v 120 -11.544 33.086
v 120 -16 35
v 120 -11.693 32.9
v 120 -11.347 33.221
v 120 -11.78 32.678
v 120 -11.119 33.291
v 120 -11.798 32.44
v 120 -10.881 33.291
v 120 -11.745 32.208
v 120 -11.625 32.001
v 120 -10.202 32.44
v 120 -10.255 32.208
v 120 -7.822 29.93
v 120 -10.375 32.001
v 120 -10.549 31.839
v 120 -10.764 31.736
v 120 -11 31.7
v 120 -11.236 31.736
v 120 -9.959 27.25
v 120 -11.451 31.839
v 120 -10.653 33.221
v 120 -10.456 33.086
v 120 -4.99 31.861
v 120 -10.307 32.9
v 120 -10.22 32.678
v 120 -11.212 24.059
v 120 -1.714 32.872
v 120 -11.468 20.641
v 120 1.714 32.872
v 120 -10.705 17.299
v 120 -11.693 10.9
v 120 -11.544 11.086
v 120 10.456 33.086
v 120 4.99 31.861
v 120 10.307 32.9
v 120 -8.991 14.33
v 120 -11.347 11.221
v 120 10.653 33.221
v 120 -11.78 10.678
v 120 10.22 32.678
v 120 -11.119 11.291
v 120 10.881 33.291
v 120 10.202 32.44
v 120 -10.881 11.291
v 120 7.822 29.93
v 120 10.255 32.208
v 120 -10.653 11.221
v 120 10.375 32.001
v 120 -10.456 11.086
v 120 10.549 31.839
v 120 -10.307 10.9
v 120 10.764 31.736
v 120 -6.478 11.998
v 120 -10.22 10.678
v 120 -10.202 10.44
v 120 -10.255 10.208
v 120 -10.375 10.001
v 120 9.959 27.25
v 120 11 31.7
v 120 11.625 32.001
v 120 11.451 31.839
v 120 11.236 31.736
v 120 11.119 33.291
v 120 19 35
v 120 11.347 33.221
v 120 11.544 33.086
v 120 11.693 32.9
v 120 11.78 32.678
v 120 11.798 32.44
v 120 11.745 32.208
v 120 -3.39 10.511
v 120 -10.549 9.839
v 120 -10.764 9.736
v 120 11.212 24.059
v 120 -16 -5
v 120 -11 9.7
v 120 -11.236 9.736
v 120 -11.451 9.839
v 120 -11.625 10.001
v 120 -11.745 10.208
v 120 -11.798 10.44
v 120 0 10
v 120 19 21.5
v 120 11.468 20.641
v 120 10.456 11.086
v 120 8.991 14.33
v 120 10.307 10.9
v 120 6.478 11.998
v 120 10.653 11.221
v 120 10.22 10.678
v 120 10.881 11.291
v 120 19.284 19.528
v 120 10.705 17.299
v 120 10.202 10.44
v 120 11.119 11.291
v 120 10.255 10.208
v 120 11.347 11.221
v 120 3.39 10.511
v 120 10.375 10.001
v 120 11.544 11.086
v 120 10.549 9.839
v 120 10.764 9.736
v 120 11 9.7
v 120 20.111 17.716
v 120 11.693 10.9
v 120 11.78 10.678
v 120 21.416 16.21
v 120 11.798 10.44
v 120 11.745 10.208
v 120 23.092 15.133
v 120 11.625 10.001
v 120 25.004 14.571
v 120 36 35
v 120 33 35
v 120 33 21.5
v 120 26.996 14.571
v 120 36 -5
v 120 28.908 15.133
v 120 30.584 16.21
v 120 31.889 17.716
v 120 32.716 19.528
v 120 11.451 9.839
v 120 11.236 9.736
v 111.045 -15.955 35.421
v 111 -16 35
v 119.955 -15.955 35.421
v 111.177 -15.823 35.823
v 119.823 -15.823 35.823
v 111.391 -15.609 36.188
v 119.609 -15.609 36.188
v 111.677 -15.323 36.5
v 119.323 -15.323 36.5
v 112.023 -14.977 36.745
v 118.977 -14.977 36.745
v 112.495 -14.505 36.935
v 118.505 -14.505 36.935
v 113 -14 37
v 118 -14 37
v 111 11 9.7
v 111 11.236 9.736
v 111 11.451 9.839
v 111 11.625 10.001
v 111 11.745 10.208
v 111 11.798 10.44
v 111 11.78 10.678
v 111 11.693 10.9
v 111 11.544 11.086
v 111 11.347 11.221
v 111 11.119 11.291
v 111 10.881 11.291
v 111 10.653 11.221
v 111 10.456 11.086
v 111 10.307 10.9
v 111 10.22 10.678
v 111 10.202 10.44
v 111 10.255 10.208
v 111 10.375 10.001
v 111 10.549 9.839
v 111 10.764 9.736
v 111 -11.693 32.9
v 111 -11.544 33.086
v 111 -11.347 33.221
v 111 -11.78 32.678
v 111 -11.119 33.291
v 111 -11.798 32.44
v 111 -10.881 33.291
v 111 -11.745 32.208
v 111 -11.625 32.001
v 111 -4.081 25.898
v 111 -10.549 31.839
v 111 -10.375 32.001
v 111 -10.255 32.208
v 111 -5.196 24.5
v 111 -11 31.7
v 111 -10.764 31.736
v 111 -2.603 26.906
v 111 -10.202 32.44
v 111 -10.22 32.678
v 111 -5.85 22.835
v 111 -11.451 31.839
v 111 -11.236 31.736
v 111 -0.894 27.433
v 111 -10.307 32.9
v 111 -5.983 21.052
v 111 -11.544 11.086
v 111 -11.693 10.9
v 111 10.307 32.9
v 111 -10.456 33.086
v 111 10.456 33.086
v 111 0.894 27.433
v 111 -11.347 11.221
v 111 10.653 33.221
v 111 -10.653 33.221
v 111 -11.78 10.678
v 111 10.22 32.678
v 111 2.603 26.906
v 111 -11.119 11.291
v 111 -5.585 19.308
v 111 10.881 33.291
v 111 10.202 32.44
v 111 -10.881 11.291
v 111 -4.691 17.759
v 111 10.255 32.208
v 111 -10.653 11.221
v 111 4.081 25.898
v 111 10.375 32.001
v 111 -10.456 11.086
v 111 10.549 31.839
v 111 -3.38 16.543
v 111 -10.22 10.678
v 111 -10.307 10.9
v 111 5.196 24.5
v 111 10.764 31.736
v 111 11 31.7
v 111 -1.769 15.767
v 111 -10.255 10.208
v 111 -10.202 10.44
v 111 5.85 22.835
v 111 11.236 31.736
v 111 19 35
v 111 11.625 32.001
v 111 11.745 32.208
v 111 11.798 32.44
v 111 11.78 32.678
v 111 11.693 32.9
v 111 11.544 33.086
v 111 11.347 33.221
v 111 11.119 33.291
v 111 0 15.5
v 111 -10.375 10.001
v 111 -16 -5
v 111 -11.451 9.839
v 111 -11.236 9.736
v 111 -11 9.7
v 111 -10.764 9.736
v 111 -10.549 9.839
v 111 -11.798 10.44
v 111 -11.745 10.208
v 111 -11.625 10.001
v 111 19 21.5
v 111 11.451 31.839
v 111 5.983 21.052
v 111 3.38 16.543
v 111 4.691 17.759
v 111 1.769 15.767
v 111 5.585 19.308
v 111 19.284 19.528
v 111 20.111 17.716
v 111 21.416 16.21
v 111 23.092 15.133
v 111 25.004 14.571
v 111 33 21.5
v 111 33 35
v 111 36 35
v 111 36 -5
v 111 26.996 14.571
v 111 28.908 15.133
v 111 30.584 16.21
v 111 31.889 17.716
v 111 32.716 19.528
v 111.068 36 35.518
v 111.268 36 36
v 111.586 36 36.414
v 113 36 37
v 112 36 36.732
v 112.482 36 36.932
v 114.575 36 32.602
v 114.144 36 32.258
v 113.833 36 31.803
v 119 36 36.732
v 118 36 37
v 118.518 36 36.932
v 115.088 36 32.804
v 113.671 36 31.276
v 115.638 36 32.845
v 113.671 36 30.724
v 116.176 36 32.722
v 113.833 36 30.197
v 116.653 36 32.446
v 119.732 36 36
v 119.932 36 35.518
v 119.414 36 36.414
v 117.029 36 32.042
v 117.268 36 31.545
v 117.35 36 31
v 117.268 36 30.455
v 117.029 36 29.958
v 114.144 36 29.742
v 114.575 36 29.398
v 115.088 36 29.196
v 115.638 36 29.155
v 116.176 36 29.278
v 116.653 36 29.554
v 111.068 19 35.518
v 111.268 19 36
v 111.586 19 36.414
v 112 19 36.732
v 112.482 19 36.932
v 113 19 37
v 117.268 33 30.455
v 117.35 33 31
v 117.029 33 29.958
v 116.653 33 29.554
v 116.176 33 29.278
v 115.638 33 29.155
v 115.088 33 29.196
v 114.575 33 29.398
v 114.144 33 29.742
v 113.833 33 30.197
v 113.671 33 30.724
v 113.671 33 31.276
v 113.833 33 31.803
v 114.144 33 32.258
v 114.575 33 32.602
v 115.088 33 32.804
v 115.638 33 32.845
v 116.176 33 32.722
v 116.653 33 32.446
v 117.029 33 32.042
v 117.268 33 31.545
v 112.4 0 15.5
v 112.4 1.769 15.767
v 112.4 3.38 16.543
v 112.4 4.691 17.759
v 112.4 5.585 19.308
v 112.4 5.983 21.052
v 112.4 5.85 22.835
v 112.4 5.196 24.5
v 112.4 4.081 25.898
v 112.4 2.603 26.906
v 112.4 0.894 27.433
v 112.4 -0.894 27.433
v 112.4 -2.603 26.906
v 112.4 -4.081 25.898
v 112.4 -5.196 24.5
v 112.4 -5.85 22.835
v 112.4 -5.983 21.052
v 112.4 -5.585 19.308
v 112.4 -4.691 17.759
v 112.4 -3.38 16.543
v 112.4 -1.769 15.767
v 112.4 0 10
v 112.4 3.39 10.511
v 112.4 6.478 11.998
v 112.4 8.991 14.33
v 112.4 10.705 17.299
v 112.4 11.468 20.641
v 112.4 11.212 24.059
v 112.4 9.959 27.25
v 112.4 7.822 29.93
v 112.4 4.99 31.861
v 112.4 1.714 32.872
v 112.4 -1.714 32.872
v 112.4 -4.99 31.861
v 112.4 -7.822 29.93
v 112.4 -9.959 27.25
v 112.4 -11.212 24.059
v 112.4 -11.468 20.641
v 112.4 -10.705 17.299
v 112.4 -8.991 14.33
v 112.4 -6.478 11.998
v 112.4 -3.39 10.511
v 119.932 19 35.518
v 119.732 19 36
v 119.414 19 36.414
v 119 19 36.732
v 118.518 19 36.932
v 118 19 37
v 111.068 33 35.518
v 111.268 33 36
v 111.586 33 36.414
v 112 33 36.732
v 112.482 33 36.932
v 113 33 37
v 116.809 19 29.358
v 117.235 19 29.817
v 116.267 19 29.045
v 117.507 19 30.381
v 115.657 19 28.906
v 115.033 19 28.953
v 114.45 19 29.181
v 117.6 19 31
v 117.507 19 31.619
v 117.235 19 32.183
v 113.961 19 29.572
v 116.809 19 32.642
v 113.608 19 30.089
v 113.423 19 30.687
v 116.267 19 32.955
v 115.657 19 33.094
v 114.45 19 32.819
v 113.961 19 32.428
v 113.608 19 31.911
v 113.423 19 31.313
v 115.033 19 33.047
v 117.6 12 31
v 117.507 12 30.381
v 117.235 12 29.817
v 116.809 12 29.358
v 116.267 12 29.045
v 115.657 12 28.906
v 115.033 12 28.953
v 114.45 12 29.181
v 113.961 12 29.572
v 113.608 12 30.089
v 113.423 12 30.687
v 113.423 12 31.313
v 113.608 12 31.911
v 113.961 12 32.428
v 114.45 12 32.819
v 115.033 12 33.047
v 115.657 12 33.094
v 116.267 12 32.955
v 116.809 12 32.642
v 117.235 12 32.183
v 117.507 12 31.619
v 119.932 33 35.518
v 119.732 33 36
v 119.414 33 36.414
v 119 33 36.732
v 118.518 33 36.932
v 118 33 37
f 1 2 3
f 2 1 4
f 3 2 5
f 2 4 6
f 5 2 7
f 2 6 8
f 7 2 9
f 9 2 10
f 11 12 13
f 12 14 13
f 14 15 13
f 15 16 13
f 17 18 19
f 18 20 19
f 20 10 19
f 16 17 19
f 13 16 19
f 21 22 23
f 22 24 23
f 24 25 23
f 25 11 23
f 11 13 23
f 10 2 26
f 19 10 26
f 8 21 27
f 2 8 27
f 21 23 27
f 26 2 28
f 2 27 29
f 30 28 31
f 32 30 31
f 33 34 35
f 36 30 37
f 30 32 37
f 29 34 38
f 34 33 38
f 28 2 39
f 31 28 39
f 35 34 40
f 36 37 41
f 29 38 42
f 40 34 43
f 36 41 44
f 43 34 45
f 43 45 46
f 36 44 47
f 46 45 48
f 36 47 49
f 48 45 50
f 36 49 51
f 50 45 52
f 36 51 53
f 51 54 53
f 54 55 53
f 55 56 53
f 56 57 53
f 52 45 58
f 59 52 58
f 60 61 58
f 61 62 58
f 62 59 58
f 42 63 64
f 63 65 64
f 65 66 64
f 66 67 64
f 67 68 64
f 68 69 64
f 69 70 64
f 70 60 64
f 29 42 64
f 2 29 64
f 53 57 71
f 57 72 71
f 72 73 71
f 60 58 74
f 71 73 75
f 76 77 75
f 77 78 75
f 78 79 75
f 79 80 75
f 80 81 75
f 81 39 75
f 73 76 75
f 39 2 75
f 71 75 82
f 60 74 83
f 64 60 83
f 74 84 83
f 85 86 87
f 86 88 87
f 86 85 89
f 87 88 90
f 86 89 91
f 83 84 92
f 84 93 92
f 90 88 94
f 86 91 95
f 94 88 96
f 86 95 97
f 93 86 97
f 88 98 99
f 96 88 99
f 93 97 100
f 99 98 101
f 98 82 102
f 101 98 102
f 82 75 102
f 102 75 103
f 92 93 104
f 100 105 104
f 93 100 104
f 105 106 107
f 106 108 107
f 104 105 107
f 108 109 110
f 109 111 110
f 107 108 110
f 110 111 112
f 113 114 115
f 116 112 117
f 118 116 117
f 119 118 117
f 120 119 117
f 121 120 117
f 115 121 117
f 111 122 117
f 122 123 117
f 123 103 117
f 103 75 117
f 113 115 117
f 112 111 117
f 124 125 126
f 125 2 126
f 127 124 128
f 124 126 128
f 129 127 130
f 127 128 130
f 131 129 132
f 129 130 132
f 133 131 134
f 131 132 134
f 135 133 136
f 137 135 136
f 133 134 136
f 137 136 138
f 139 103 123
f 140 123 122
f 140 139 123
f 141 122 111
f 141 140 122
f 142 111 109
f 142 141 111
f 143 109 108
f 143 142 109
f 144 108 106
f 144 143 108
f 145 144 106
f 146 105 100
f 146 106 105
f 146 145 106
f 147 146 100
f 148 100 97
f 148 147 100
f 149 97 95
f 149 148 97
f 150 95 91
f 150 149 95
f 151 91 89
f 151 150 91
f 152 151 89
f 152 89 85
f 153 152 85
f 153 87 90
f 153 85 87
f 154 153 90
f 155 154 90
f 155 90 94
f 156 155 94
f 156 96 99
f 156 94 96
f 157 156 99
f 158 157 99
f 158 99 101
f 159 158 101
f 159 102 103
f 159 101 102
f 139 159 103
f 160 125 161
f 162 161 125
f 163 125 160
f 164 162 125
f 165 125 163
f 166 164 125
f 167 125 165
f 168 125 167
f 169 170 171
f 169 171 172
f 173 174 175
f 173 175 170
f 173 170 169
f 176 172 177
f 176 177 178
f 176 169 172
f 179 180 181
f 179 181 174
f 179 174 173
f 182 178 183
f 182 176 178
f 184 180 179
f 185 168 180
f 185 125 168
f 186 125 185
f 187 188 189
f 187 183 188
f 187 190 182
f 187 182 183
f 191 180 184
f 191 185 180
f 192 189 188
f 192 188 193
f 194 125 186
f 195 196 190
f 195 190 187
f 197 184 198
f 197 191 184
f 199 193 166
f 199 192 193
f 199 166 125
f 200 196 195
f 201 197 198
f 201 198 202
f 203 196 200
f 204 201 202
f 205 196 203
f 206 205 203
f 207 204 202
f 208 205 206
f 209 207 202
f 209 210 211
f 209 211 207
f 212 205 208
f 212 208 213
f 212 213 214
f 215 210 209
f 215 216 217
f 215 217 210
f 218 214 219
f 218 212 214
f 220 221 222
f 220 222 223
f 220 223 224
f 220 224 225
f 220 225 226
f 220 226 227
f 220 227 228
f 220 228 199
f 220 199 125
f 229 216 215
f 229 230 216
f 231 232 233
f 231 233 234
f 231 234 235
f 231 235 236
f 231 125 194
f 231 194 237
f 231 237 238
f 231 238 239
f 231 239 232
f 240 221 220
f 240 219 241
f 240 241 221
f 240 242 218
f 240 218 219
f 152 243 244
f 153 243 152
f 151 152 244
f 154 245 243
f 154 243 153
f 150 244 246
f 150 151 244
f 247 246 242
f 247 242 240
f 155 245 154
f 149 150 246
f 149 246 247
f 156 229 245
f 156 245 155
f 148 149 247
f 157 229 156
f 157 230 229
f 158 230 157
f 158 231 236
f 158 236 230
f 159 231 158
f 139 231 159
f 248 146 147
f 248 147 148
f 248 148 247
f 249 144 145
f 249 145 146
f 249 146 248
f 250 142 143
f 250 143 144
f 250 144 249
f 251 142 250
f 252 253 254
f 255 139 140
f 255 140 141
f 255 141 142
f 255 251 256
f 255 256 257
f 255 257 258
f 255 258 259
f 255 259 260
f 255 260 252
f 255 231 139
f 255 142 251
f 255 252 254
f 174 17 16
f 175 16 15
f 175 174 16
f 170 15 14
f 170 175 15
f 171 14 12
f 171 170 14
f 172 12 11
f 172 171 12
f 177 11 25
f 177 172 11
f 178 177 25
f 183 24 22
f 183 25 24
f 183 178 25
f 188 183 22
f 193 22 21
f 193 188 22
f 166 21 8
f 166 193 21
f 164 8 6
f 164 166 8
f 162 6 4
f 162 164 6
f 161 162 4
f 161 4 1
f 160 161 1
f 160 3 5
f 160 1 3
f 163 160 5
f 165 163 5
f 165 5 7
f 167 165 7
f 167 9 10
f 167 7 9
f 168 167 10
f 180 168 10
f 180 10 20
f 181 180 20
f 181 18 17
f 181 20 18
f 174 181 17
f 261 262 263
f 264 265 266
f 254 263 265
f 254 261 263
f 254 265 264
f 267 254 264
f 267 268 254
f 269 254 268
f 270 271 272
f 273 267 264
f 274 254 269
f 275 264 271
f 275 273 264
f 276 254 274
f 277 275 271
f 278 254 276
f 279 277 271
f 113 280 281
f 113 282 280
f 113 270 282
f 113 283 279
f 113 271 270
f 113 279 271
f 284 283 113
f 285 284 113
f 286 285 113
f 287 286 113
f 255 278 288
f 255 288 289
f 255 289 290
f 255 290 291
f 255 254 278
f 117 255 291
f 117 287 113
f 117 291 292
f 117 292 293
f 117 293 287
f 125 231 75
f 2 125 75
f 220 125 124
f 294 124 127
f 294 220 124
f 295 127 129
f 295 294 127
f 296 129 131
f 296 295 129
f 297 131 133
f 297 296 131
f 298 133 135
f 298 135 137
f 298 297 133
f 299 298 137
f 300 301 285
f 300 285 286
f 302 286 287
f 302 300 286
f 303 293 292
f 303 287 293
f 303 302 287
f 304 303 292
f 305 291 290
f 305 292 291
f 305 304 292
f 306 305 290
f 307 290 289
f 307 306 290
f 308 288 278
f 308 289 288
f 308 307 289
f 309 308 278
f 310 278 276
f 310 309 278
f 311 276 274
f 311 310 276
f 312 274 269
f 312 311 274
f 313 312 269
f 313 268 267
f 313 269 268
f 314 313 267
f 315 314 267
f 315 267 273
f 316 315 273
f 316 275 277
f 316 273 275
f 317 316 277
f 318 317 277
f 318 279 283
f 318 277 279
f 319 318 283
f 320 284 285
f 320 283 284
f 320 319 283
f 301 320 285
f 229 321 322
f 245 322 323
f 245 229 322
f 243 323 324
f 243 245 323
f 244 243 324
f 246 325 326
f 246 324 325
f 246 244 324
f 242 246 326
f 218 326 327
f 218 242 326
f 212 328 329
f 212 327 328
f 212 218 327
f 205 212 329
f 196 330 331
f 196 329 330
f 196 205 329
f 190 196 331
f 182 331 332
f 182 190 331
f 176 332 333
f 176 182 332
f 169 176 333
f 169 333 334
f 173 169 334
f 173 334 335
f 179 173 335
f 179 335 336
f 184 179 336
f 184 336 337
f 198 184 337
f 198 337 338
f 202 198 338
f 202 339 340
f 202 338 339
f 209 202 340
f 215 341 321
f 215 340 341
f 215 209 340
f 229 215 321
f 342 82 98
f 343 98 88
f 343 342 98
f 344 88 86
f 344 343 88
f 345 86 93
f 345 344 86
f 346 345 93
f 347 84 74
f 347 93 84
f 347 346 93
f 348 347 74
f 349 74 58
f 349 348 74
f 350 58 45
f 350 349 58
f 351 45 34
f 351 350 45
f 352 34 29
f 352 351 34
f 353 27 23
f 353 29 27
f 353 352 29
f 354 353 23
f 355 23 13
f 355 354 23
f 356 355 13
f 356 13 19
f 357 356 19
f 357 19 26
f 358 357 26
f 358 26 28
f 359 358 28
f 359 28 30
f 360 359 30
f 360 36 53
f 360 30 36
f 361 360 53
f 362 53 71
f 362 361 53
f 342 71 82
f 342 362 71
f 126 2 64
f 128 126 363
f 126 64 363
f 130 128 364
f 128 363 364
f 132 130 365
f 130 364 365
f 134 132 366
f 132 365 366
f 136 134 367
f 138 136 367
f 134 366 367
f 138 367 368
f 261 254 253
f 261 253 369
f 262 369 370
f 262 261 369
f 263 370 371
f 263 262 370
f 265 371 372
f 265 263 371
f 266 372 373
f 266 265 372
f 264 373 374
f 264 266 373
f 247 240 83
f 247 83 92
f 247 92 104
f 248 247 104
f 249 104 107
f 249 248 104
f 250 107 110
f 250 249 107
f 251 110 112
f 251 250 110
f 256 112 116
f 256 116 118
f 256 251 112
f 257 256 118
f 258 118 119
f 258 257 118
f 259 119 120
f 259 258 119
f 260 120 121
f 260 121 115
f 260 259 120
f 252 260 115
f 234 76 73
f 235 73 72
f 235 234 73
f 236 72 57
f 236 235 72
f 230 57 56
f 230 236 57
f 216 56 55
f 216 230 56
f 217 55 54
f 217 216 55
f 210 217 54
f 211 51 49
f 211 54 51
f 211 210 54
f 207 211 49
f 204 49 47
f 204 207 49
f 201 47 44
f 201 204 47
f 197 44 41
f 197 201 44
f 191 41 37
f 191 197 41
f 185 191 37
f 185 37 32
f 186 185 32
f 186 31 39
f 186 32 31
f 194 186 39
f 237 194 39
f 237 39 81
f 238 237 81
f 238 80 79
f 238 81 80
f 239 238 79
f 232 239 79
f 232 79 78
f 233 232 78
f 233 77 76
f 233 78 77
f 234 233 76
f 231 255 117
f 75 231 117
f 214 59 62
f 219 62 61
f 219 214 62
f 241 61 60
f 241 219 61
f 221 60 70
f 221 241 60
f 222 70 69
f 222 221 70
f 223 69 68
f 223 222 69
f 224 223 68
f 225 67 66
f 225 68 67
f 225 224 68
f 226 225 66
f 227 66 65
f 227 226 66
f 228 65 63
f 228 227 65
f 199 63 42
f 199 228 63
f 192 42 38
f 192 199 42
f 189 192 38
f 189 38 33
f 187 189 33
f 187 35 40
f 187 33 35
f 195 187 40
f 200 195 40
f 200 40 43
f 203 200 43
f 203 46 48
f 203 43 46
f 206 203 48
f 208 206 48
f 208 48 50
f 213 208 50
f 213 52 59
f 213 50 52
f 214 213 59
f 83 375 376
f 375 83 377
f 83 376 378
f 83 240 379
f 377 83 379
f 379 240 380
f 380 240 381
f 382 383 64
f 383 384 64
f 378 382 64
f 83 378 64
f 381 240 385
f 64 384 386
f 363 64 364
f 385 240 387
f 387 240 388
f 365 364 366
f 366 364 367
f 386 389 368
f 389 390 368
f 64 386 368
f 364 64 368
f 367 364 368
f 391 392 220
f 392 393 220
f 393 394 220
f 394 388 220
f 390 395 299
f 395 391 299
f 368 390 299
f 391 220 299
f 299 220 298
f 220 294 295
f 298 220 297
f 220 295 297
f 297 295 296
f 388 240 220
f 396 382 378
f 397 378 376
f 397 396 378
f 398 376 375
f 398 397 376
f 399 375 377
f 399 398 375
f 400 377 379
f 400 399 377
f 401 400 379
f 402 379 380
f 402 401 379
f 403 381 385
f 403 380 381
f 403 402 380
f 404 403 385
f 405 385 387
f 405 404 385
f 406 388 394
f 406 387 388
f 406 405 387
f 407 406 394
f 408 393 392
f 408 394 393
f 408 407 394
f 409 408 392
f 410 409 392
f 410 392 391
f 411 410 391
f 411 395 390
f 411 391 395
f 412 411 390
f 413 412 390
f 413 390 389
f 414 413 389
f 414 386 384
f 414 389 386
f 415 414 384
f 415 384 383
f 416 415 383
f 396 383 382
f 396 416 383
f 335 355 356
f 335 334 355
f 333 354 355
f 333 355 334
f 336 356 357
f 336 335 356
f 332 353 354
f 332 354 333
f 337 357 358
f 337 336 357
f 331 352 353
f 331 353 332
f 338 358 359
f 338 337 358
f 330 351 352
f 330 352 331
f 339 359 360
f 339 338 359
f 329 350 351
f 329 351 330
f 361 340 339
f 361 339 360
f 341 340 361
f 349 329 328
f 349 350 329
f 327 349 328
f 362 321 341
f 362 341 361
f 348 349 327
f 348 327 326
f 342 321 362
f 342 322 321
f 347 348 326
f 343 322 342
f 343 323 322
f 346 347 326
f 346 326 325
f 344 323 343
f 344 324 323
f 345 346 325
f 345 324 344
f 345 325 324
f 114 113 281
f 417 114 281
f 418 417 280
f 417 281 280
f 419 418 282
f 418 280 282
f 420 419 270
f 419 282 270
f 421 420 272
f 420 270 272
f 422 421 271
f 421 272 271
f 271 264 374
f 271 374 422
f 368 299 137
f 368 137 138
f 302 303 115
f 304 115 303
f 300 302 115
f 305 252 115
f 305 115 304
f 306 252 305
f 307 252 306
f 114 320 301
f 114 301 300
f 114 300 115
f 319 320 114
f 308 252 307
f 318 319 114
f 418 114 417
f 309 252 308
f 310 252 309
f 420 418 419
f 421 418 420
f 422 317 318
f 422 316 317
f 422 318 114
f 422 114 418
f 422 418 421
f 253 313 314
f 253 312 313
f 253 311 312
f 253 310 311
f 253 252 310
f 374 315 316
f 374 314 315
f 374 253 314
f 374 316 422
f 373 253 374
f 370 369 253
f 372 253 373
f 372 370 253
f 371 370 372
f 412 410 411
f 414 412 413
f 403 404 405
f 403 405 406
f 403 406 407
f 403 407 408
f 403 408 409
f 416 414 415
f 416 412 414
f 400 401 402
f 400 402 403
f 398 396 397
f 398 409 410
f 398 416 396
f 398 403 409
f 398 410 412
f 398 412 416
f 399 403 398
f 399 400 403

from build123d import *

# Parameters (mm, degrees)
CYLINDER100_R               = 6
CYLINDER100_DEPTH           = 9
CYLINDER020_R               = 0.8
CYLINDER020_DEPTH           = 20
ARRAY001006_X_COUNT         = 2
ARRAY001006_X_PITCH         = 22
ARRAY001006_Y_COUNT         = 2
ARRAY001006_Y_PITCH         = 22
ARRAY001006_PLACEMENT_ANGLE = 90
CYLINDER101_R               = 7
CYLINDER101_DEPTH           = 9
BOX008_W                    = 14
BOX008_H                    = 50
BOX008_DEPTH                = 9
FUSION008_ROLL_ANGLE        = 90
FUSION008_PLACEMENT_ANGLE   = 90
CYLINDER106_R               = 2.1
CYLINDER106_DEPTH           = 10
CYLINDER105_R               = 1.85
CYLINDER105_DEPTH           = 20
FUSION009_PLACEMENT_ANGLE   = 90
CYLINDER099_R               = 11.5
CYLINDER099_DEPTH           = 9
BOX_W                       = 9
BOX_H                       = 52
BOX_DEPTH                   = 42
FILLET_R                    = 2


with BuildPart() as lead_hole:
    # Cylinder100 → Cylinder100 (new body)
    with BuildSketch(Plane(origin=(111, 0, 21.5), x_dir=(0, 0, -1), z_dir=(1, 0, 0))):
        Circle(CYLINDER100_R)
    extrude(amount=CYLINDER100_DEPTH)


with BuildPart() as lead_holder_hole_array001:
    # Cylinder020 → Cylinder020 (new body)
    with BuildSketch(Plane.XY):
        Circle(CYLINDER020_R)
    extrude(amount=CYLINDER020_DEPTH)

    # Array001006 X: lead holder hole array001 ×2


with BuildPart() as lead_holder_hole_array001_1:
    add(lead_holder_hole_array001.part)
    with Locations(*[(i * ARRAY001006_X_PITCH, 0, 0) for i in range(1, ARRAY001006_X_COUNT)]):
        add(lead_holder_hole_array001.part)

    # Array001006 Y: lead holder hole array001 ×2


with BuildPart() as lead_holder_hole_array001_2:
    add(lead_holder_hole_array001_1.part)
    with Locations(*[(0, i * ARRAY001006_Y_PITCH, 0) for i in range(1, ARRAY001006_Y_COUNT)]):
        add(lead_holder_hole_array001_1.part)


with BuildPart() as lead_holder_hole_array001_3:
    # Array001006 placement: moved
    add(lead_holder_hole_array001_2.part.moved(Location((111, -11, 32.5))).rotate(Axis((111, -11, 32.5), (0, 1, 0)), ARRAY001006_PLACEMENT_ANGLE))


with BuildPart() as syringe_hole:
    # Cylinder101 → Cylinder101 (new body)
    with BuildSketch(Plane.XY):
        Circle(CYLINDER101_R)
    extrude(amount=CYLINDER101_DEPTH)


with BuildPart() as syringe_hole_fusion:
    # Box008 → Box008 (new body)
    with BuildSketch(Plane(origin=(-7, 0, 0), x_dir=(1, 0, 0), z_dir=(0, 0, 1))):
        with Locations((7, 25)):
            Rectangle(BOX008_W, BOX008_H)
    extrude(amount=BOX008_DEPTH)

    # Fusion008: union syringe_hole
    add(syringe_hole.part)


with BuildPart() as syringe_hole_fusion_1:
    # Fusion008 roll: moved
    add(syringe_hole_fusion.part.rotate(Axis((0, 0, 0), (1, 0, 0)), FUSION008_ROLL_ANGLE))


with BuildPart() as syringe_hole_fusion_2:
    # Fusion008 placement: moved
    add(syringe_hole_fusion_1.part.moved(Location((111, 26, 21.5))).rotate(Axis((111, 26, 21.5), (0, 0, 1)), FUSION008_PLACEMENT_ANGLE))


with BuildPart() as insert_hole001:
    # Cylinder106 → Cylinder106 (new body)
    with BuildSketch(Plane.XY):
        Circle(CYLINDER106_R)
    extrude(amount=CYLINDER106_DEPTH)


with BuildPart() as bolt_insert_hole_fusion:
    # Cylinder105 → Cylinder105 (new body)
    with BuildSketch(Plane.XY.offset(10)):
        Circle(CYLINDER105_R)
    extrude(amount=CYLINDER105_DEPTH)

    # Fusion009: union insert hole001
    add(insert_hole001.part)


with BuildPart() as bolt_insert_hole_fusion_1:
    # Fusion009 placement: moved
    add(bolt_insert_hole_fusion.part.moved(Location((115.5, 12, 31))).rotate(Axis((115.5, 12, 31), (-1, 0, 0)), FUSION009_PLACEMENT_ANGLE))


with BuildPart() as bearing_hole_fusion:
    # Cylinder099 → Cylinder099 (new body)
    with BuildSketch(Plane(origin=(112.4, 0, 21.5), x_dir=(0, 0, -1), z_dir=(1, 0, 0))):
        Circle(CYLINDER099_R)
    extrude(amount=CYLINDER099_DEPTH)

    # Fusion: union lead hole, lead holder hole array001, syringe hole fusion, bolt insert hole fusion
    add(lead_hole.part)
    add(lead_holder_hole_array001_3.part)
    add(syringe_hole_fusion_2.part)
    add(bolt_insert_hole_fusion_1.part)


with BuildPart() as bearing_wall_cut:
    # Box → Box (new body)
    with BuildSketch(Plane(origin=(0, -16, -5), x_dir=(1, 0, 0), z_dir=(0, 0, 1))):
        with Locations((4.5, 26)):
            Rectangle(BOX_W, BOX_H)
    extrude(amount=BOX_DEPTH)

    # Fillet
    fillet_edges = [bearing_wall_cut.edges().sort_by_distance(p)[0] for p in [
        (0, 10, 37),
        (9, 10, 37),
        (4.5, -16, 37),
    ]]
    fillet(fillet_edges, radius=FILLET_R)


with BuildPart() as bearing_wall_cut_1:
    # Compound placement: moved
    add(bearing_wall_cut.part.moved(Location((111, 0, 0))))

    # Cut: cut bearing hole fusion
    add(bearing_hole_fusion.part, mode=Mode.SUBTRACT)


solid = bearing_wall_cut_1.part
